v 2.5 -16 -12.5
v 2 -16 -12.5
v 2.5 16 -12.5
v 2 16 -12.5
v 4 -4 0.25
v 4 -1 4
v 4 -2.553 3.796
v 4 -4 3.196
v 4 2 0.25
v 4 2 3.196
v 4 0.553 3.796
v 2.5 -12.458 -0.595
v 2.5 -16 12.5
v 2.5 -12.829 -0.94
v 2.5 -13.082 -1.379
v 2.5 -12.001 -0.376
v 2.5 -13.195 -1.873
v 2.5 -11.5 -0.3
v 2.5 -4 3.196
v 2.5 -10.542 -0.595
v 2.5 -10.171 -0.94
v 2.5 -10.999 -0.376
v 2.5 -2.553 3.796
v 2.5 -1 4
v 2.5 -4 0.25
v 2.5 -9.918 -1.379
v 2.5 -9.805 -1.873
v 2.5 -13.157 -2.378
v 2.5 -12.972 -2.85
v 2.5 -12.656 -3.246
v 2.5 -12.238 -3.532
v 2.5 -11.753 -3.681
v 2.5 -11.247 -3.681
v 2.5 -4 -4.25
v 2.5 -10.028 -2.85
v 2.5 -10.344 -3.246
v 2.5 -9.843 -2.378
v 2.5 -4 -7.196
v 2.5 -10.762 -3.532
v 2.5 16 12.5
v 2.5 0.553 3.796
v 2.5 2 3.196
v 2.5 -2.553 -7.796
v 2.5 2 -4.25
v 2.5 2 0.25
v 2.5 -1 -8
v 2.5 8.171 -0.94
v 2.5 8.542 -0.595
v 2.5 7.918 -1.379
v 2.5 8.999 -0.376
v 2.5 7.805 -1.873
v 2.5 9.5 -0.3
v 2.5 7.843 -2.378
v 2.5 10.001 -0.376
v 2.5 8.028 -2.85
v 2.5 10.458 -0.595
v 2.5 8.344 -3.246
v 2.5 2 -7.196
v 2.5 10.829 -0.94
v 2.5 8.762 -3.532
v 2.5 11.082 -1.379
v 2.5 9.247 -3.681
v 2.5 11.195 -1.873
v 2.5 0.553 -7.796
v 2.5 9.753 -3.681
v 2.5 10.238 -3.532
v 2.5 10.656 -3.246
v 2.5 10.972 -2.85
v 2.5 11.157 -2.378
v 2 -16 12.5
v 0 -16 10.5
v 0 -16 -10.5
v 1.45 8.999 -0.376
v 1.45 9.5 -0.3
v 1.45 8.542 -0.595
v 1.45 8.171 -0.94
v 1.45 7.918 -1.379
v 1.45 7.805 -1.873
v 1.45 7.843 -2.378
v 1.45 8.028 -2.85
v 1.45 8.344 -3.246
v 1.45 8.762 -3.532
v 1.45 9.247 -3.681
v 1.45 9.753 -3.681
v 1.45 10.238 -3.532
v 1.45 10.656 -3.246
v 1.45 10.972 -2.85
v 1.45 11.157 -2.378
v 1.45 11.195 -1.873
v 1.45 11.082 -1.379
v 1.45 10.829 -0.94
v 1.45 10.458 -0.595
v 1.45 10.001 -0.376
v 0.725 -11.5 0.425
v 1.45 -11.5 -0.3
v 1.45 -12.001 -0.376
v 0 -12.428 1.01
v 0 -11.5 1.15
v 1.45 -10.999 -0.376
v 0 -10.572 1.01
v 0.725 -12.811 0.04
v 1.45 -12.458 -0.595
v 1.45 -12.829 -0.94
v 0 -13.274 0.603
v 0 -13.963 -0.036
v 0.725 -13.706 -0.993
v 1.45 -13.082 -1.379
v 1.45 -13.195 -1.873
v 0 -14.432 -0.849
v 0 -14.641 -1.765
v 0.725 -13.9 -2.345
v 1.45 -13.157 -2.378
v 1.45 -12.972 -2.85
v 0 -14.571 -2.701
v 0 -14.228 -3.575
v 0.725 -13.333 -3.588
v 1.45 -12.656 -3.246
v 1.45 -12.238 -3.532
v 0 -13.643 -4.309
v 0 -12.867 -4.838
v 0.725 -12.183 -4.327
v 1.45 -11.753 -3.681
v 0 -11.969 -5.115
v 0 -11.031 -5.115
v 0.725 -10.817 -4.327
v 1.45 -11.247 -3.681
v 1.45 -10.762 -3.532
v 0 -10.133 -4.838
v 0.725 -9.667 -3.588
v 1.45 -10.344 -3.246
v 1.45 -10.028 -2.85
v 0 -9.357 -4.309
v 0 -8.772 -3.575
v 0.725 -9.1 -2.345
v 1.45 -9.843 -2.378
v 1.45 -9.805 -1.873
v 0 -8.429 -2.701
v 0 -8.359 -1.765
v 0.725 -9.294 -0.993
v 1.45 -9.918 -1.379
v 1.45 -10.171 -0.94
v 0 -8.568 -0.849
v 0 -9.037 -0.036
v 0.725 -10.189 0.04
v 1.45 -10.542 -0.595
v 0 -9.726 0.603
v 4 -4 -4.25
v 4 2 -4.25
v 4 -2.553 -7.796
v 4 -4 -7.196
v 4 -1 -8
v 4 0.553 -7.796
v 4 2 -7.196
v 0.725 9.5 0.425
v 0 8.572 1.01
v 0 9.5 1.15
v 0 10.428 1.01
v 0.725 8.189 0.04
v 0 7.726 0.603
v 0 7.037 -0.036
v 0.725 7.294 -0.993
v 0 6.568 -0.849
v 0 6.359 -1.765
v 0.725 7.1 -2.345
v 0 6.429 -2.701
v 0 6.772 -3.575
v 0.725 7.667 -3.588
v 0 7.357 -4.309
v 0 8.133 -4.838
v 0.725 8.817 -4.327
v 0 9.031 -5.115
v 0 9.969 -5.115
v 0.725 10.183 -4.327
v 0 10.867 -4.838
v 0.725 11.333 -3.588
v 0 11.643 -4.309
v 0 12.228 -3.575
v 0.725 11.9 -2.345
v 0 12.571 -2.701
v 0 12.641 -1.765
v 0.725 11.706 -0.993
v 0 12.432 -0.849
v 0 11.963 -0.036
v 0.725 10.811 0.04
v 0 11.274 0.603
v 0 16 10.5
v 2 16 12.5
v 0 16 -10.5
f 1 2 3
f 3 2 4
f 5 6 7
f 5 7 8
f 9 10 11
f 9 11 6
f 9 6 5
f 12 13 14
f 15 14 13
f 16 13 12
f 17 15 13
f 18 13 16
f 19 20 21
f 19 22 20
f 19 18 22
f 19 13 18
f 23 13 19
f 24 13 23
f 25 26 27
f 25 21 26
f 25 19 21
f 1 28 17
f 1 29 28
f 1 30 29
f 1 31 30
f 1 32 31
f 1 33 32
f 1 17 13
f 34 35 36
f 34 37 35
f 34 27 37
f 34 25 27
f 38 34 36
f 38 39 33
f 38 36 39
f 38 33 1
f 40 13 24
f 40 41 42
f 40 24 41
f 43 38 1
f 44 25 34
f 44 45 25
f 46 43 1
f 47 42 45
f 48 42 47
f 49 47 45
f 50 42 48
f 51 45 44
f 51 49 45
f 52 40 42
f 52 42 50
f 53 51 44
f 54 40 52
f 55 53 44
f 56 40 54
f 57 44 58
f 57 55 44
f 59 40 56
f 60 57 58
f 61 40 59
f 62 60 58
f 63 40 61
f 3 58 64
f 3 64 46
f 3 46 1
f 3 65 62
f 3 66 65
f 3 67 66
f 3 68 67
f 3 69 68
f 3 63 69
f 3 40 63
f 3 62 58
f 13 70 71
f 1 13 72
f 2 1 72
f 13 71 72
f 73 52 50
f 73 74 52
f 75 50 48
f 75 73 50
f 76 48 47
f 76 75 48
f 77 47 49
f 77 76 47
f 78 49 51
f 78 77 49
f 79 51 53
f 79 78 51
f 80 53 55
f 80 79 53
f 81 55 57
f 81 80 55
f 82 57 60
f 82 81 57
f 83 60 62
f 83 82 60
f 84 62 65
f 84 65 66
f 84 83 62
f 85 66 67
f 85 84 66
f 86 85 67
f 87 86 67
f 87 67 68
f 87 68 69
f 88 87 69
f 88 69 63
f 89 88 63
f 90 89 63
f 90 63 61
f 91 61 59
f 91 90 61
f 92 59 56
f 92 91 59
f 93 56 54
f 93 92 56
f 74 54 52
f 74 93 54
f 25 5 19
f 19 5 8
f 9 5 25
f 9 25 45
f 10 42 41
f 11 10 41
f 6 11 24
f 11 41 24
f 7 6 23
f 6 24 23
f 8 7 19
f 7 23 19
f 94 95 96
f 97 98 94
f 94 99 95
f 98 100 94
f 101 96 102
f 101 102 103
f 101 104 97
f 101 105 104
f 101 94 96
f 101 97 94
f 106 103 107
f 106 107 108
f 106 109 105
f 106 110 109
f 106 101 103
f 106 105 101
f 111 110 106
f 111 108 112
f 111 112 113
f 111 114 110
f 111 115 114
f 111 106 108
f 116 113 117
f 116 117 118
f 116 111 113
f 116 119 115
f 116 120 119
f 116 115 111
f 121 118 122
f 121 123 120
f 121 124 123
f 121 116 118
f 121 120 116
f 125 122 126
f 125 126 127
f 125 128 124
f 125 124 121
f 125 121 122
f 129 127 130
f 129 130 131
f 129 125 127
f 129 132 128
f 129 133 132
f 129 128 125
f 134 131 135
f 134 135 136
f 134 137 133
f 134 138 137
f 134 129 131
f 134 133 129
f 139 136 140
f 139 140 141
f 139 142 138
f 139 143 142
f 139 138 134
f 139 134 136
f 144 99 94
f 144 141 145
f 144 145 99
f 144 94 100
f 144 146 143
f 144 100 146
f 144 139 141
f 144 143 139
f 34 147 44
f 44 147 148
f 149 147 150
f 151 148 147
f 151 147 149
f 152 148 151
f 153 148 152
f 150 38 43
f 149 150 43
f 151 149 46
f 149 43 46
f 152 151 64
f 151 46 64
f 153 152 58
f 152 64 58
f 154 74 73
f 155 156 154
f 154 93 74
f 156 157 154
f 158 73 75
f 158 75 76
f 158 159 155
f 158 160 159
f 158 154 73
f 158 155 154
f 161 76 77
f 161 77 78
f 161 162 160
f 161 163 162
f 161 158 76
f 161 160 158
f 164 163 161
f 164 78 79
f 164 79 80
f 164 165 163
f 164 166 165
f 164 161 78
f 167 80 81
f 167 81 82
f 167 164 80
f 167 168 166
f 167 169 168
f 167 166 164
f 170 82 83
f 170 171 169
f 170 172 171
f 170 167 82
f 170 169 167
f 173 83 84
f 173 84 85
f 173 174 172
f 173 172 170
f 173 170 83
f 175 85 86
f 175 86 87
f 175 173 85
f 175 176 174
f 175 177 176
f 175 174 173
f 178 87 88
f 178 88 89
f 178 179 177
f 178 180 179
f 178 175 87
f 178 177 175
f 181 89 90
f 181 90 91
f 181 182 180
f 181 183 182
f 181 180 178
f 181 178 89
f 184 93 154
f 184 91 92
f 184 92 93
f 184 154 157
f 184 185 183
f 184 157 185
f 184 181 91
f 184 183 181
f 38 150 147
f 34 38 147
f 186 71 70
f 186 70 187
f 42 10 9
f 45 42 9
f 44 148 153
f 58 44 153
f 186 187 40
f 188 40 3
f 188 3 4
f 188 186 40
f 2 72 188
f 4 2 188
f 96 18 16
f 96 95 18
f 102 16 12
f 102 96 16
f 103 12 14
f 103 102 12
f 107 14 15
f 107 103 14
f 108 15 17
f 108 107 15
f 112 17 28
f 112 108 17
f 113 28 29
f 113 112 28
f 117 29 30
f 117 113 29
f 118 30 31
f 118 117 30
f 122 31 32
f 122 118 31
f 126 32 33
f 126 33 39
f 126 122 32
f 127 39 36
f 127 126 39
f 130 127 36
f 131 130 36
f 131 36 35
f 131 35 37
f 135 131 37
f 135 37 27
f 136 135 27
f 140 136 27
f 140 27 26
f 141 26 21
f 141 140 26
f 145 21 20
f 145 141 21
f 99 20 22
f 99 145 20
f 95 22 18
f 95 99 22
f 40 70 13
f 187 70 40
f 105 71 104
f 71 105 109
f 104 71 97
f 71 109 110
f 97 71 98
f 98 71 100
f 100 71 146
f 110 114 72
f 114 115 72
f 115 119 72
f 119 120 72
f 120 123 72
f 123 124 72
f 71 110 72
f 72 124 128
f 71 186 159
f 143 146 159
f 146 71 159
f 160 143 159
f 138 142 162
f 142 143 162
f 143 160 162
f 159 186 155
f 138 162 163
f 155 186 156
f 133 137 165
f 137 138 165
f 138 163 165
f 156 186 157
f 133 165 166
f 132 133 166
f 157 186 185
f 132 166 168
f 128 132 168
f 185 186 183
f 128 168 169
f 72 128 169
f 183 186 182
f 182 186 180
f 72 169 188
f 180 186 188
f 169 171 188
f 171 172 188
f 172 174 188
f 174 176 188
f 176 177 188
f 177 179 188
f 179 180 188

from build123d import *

# Parameters (mm, degrees)
SKETCH_1_W                 = 25
SKETCH_1_H                 = 32
EXTRUDE_1_DEPTH            = 2.5
CHAMFER_1_SIZE             = 2
HOLE_WIZARD_M31_AT_2_COUNT = 2
HOLE_WIZARD_M31_AT_2_PITCH = 21
SKETCH_4_R                 = 6
SKETCH_4_R_2               = 3.5
EXTRUDE_2_DEPTH            = 1.5
SKETCH_5_W                 = 4.5
SKETCH_5_H                 = 16
CUT_EXTRUDE_1_DEPTH        = 1.5
CUT_EXTRUDE_2_DEPTH        = 1.5


with BuildPart() as part:
    # Эскиз1 → Бобышка-Вытянуть1 (new body)
    with BuildSketch(Plane(origin=(0, 0, 0), x_dir=(0, 0, -1), z_dir=(1, 0, 0))):
        Rectangle(SKETCH_1_W, SKETCH_1_H)
    extrude(amount=EXTRUDE_1_DEPTH)

    # Фаска1
    chamfer_1_edges = [part.edges().sort_by_distance(p)[0] for p in [
        (0, 0, 12.5),
        (0, 0, -12.5),
    ]]
    chamfer(chamfer_1_edges, length=CHAMFER_1_SIZE)

    # Эскиз3 → Зенковка для  винта с плоской головкой M31 (revolve, cut)
    with BuildSketch(Plane(origin=(0, -11.5, -2), x_dir=(0, 0, 1), z_dir=(0, 1, 0))):
        Polygon((0, 0), (0, 2.5), (1.7, 2.5), (1.7, 1.45), (3.15, 0), align=None)
    hole_wizard_m31 = revolve(axis=Axis((-6.35, -11.5, -2), (1, 0, 0)), mode=Mode.SUBTRACT)

    # Зенковка для  винта с плоской головкой M31 at 2: Зенковка для  винта с плоской головкой M31 ×2
    with Locations(*[(0, i * HOLE_WIZARD_M31_AT_2_PITCH, 0) for i in range(1, HOLE_WIZARD_M31_AT_2_COUNT)]):
        add(hole_wizard_m31, mode=Mode.SUBTRACT)

    # Эскиз4 → Бобышка-Вытянуть2 (add)
    with BuildSketch(Plane(origin=(2.5, 0, 0), x_dir=(0, 0, -1), z_dir=(1, 0, 0))):
        with Locations((2, -1)):
            Circle(SKETCH_4_R)
        with Locations((2, -1)):
            Circle(SKETCH_4_R_2, mode=Mode.SUBTRACT)
        with BuildLine():
            ThreePointArc((-0.25, 1.680951324), (-1.5, -1), (-0.25, -3.680951324))
            Line((-0.25, -3.680951324), (-0.25, 1.680951324))
        make_face()
        with BuildLine():
            Line((4.25, 1.680951324), (4.25, -3.680951324))
            ThreePointArc((4.25, -3.680951324), (5.172144385, -2.479019946), (5.5, -1))
            ThreePointArc((5.5, -1), (5.172144385, 0.479019946), (4.25, 1.680951324))
        make_face()
    extrude(amount=EXTRUDE_2_DEPTH)

    # Эскиз5 → Вырез-Вытянуть1 (cut)
    with BuildSketch(Plane(origin=(4, 0, 0), x_dir=(0, 0, -1), z_dir=(1, 0, 0))):
        with Locations((2, -1)):
            Rectangle(SKETCH_5_W, SKETCH_5_H)
    extrude(amount=-CUT_EXTRUDE_1_DEPTH, mode=Mode.SUBTRACT)

    # Эскиз6 → Вырез-Вытянуть2 (cut)
    with BuildSketch(Plane(origin=(4, 0, 0), x_dir=(0, 0, -1), z_dir=(1, 0, 0))):
        with BuildLine():
            ThreePointArc((4.25, 4.562148865), (0.047794779, 4.67352578), (-3.196152423, 2))
            Line((-3.196152423, 2), (4.25, 2))
            Line((4.25, 2), (4.25, 4.562148865))
        make_face()
        with BuildLine():
            Line((4.25, 4.562148865), (4.25, 2))
            Line((4.25, 2), (7.196152423, 2))
            ThreePointArc((7.196152423, 2), (5.937314844, 3.527422205), (4.25, 4.562148865))
        make_face()
        with BuildLine():
            Line((4.25, -4), (-3.196152423, -4))
            ThreePointArc((-3.196152423, -4), (0.047794779, -6.67352578), (4.25, -6.562148865))
            Line((4.25, -6.562148865), (4.25, -4))
        make_face()
        with BuildLine():
            Line((7.196152423, -4), (4.25, -4))
            Line((4.25, -4), (4.25, -6.562148865))
            ThreePointArc((4.25, -6.562148865), (5.937314844, -5.527422205), (7.196152423, -4))
        make_face()
    extrude(amount=-CUT_EXTRUDE_2_DEPTH, mode=Mode.SUBTRACT)


solid = part.part
